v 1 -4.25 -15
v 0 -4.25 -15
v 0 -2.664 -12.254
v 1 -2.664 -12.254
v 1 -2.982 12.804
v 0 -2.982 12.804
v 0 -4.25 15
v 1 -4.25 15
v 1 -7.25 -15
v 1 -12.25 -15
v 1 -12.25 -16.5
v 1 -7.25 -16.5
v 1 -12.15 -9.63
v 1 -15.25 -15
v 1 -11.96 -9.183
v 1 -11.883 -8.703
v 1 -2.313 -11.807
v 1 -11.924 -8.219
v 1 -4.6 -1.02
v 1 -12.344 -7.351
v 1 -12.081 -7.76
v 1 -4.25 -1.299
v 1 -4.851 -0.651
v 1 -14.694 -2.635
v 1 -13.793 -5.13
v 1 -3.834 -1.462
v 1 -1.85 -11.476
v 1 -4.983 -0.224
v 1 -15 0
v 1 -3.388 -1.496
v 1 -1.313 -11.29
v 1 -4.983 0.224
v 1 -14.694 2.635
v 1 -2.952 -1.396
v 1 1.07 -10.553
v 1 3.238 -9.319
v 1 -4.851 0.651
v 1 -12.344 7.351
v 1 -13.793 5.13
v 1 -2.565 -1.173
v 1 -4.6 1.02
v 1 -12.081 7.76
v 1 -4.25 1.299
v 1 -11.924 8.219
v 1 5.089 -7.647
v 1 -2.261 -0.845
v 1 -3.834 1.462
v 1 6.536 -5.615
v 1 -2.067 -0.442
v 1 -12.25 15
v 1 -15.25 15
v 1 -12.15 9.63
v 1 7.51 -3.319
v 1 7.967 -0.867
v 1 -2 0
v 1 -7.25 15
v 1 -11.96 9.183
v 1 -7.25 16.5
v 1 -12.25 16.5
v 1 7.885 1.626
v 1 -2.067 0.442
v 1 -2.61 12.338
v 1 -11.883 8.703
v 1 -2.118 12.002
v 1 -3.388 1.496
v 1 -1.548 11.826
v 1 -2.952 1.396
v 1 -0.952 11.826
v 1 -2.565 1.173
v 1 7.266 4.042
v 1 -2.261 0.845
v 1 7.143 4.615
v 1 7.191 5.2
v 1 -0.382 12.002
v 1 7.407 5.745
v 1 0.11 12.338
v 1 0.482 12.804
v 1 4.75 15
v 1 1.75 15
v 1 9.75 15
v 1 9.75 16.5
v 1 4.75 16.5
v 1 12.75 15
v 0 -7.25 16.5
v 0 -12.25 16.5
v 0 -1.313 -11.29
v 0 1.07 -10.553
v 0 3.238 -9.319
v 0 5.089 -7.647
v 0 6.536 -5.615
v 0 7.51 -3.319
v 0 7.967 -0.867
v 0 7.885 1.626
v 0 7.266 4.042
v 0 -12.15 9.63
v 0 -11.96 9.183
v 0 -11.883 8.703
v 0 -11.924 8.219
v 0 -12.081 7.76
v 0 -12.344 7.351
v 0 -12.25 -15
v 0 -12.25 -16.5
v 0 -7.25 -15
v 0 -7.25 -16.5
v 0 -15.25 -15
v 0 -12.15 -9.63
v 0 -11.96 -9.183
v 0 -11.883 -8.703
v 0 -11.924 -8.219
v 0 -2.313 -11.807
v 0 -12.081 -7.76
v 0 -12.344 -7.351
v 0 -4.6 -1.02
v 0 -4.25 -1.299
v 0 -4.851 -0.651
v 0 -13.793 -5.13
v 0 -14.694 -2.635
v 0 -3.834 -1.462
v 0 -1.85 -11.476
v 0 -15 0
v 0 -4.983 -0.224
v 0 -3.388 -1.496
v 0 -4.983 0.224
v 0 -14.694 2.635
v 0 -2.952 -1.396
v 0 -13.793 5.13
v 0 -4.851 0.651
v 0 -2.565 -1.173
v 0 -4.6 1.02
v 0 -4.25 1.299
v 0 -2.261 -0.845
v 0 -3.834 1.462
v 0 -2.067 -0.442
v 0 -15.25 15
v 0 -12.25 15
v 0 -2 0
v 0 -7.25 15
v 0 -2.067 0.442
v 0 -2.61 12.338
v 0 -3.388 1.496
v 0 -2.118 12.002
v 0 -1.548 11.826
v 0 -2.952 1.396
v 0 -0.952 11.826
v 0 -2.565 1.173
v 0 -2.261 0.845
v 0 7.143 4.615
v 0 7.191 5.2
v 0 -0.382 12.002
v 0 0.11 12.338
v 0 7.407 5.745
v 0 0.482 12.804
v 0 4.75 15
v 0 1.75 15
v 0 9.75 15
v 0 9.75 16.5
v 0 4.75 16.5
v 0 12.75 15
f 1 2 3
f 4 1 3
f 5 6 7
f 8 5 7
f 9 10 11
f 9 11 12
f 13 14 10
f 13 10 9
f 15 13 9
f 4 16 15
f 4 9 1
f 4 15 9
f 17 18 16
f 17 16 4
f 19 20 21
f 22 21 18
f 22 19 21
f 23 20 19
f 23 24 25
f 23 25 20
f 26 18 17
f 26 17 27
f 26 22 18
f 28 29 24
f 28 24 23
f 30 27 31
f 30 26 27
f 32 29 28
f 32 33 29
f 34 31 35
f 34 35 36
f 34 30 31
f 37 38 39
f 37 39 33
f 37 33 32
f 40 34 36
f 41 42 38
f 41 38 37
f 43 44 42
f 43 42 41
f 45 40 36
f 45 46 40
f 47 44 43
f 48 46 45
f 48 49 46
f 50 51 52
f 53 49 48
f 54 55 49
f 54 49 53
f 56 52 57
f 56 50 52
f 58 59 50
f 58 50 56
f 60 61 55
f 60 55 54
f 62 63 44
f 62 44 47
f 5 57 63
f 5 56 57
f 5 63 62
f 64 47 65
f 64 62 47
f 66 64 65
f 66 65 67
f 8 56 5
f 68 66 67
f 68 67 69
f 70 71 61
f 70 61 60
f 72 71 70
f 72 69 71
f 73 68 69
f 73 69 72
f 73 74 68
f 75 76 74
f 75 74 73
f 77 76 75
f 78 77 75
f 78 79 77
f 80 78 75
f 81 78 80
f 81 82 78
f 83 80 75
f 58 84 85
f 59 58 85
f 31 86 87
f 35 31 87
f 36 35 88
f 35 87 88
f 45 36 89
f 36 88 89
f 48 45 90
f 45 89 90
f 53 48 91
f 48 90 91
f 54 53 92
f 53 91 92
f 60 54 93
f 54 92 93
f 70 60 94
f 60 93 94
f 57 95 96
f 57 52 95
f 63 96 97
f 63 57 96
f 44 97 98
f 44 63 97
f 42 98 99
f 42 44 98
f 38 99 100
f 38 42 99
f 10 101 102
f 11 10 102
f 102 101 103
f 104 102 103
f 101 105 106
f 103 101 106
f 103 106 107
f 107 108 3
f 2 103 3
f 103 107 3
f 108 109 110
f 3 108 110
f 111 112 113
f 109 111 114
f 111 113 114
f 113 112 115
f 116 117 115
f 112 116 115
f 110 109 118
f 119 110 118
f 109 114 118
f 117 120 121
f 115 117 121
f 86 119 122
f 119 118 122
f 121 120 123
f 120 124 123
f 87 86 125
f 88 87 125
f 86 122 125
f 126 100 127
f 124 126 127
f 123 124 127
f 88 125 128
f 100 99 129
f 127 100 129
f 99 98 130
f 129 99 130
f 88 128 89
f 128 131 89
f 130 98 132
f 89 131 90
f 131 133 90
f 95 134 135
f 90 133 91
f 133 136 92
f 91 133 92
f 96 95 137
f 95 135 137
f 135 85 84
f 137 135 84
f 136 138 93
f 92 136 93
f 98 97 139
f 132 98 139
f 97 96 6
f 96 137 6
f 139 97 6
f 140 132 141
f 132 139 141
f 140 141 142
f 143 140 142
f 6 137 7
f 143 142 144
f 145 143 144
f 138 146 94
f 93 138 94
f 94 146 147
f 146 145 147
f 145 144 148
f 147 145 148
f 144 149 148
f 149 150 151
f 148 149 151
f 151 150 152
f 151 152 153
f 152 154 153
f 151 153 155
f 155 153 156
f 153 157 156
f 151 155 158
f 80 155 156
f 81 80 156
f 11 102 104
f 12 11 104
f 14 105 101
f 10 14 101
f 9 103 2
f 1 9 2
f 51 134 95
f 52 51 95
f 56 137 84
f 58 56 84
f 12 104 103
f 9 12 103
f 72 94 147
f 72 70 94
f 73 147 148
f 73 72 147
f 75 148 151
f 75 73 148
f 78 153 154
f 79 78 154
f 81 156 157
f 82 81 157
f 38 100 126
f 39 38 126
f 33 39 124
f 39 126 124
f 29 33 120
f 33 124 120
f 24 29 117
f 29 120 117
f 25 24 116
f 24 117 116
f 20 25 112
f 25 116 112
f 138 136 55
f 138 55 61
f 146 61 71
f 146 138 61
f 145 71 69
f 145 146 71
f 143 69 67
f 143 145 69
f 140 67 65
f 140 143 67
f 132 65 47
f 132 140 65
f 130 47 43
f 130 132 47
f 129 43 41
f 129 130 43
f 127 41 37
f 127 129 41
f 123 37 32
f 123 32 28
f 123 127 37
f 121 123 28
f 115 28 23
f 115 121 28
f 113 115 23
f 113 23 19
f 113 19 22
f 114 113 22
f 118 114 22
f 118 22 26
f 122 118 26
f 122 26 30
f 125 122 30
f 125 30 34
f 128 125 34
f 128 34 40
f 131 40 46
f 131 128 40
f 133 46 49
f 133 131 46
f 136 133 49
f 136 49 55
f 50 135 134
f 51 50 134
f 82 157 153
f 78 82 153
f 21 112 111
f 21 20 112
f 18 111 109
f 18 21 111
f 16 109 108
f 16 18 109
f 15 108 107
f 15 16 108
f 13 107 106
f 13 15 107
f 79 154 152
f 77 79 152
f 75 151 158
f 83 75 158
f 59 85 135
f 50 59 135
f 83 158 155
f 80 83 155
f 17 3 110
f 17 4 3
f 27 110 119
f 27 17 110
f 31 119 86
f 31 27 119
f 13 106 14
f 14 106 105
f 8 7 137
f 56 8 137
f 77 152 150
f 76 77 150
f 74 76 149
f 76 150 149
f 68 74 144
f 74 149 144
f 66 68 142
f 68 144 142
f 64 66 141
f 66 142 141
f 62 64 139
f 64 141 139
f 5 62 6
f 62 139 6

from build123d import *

# Parameters (mm, degrees)
F0_R     = 1.5
F1_DEPTH = 1
F2_R     = 2


with BuildPart() as f1:
    # F0 (on Right) → F1 (new body)
    with BuildSketch(Plane.YZ):
        with BuildLine():
            Line((-12.25, 15), (-15.25, 15))
            Line((-15.25, 15), (-11.409494, 8.348048))
            ThreePointArc((-11.409494, 8.348048), (-15, 0), (-11.409494, -8.348048))
            Line((-11.409494, -8.348048), (-15.25, -15))
            Line((-15.25, -15), (-12.25, -15))
            Line((-12.25, -15), (-12.25, -16.5))
            Line((-12.25, -16.5), (-7.25, -16.5))
            Line((-7.25, -16.5), (-7.25, -15))
            Line((-7.25, -15), (-4.25, -15))
            Line((-4.25, -15), (-2.185775, -11.424658))
            ThreePointArc((-2.185775, -11.424658), (6.543653, -5.601343), (6.910541, 4.88576))
            Line((6.910541, 4.88576), (12.75, 15))
            Line((12.75, 15), (9.75, 15))
            Line((9.75, 15), (9.75, 16.5))
            Line((9.75, 16.5), (4.75, 16.5))
            Line((4.75, 16.5), (4.75, 15))
            Line((4.75, 15), (1.75, 15))
            Line((1.75, 15), (0.482051, 12.803848))
            ThreePointArc((0.482051, 12.803848), (-1.25, 11.803848), (-2.982051, 12.803848))
            Line((-2.982051, 12.803848), (-4.25, 15))
            Line((-4.25, 15), (-7.25, 15))
            Line((-7.25, 15), (-7.25, 16.5))
            Line((-7.25, 16.5), (-12.25, 16.5))
            Line((-12.25, 16.5), (-12.25, 15))
        make_face()
        with Locations((-3.5, 0)):
            Circle(F0_R, mode=Mode.SUBTRACT)
    extrude(amount=F1_DEPTH)

    # F2
    f2_edges = [f1.edges().sort_by_distance(p)[0] for p in [
        (0.5, -11.409494, 8.348048),
        (0.5, -11.409494, -8.348048),
        (0.5, -2.185775, -11.424658),
        (0.5, 6.910541, 4.88576),
    ]]
    fillet(f2_edges, radius=F2_R)


solid = f1.part
